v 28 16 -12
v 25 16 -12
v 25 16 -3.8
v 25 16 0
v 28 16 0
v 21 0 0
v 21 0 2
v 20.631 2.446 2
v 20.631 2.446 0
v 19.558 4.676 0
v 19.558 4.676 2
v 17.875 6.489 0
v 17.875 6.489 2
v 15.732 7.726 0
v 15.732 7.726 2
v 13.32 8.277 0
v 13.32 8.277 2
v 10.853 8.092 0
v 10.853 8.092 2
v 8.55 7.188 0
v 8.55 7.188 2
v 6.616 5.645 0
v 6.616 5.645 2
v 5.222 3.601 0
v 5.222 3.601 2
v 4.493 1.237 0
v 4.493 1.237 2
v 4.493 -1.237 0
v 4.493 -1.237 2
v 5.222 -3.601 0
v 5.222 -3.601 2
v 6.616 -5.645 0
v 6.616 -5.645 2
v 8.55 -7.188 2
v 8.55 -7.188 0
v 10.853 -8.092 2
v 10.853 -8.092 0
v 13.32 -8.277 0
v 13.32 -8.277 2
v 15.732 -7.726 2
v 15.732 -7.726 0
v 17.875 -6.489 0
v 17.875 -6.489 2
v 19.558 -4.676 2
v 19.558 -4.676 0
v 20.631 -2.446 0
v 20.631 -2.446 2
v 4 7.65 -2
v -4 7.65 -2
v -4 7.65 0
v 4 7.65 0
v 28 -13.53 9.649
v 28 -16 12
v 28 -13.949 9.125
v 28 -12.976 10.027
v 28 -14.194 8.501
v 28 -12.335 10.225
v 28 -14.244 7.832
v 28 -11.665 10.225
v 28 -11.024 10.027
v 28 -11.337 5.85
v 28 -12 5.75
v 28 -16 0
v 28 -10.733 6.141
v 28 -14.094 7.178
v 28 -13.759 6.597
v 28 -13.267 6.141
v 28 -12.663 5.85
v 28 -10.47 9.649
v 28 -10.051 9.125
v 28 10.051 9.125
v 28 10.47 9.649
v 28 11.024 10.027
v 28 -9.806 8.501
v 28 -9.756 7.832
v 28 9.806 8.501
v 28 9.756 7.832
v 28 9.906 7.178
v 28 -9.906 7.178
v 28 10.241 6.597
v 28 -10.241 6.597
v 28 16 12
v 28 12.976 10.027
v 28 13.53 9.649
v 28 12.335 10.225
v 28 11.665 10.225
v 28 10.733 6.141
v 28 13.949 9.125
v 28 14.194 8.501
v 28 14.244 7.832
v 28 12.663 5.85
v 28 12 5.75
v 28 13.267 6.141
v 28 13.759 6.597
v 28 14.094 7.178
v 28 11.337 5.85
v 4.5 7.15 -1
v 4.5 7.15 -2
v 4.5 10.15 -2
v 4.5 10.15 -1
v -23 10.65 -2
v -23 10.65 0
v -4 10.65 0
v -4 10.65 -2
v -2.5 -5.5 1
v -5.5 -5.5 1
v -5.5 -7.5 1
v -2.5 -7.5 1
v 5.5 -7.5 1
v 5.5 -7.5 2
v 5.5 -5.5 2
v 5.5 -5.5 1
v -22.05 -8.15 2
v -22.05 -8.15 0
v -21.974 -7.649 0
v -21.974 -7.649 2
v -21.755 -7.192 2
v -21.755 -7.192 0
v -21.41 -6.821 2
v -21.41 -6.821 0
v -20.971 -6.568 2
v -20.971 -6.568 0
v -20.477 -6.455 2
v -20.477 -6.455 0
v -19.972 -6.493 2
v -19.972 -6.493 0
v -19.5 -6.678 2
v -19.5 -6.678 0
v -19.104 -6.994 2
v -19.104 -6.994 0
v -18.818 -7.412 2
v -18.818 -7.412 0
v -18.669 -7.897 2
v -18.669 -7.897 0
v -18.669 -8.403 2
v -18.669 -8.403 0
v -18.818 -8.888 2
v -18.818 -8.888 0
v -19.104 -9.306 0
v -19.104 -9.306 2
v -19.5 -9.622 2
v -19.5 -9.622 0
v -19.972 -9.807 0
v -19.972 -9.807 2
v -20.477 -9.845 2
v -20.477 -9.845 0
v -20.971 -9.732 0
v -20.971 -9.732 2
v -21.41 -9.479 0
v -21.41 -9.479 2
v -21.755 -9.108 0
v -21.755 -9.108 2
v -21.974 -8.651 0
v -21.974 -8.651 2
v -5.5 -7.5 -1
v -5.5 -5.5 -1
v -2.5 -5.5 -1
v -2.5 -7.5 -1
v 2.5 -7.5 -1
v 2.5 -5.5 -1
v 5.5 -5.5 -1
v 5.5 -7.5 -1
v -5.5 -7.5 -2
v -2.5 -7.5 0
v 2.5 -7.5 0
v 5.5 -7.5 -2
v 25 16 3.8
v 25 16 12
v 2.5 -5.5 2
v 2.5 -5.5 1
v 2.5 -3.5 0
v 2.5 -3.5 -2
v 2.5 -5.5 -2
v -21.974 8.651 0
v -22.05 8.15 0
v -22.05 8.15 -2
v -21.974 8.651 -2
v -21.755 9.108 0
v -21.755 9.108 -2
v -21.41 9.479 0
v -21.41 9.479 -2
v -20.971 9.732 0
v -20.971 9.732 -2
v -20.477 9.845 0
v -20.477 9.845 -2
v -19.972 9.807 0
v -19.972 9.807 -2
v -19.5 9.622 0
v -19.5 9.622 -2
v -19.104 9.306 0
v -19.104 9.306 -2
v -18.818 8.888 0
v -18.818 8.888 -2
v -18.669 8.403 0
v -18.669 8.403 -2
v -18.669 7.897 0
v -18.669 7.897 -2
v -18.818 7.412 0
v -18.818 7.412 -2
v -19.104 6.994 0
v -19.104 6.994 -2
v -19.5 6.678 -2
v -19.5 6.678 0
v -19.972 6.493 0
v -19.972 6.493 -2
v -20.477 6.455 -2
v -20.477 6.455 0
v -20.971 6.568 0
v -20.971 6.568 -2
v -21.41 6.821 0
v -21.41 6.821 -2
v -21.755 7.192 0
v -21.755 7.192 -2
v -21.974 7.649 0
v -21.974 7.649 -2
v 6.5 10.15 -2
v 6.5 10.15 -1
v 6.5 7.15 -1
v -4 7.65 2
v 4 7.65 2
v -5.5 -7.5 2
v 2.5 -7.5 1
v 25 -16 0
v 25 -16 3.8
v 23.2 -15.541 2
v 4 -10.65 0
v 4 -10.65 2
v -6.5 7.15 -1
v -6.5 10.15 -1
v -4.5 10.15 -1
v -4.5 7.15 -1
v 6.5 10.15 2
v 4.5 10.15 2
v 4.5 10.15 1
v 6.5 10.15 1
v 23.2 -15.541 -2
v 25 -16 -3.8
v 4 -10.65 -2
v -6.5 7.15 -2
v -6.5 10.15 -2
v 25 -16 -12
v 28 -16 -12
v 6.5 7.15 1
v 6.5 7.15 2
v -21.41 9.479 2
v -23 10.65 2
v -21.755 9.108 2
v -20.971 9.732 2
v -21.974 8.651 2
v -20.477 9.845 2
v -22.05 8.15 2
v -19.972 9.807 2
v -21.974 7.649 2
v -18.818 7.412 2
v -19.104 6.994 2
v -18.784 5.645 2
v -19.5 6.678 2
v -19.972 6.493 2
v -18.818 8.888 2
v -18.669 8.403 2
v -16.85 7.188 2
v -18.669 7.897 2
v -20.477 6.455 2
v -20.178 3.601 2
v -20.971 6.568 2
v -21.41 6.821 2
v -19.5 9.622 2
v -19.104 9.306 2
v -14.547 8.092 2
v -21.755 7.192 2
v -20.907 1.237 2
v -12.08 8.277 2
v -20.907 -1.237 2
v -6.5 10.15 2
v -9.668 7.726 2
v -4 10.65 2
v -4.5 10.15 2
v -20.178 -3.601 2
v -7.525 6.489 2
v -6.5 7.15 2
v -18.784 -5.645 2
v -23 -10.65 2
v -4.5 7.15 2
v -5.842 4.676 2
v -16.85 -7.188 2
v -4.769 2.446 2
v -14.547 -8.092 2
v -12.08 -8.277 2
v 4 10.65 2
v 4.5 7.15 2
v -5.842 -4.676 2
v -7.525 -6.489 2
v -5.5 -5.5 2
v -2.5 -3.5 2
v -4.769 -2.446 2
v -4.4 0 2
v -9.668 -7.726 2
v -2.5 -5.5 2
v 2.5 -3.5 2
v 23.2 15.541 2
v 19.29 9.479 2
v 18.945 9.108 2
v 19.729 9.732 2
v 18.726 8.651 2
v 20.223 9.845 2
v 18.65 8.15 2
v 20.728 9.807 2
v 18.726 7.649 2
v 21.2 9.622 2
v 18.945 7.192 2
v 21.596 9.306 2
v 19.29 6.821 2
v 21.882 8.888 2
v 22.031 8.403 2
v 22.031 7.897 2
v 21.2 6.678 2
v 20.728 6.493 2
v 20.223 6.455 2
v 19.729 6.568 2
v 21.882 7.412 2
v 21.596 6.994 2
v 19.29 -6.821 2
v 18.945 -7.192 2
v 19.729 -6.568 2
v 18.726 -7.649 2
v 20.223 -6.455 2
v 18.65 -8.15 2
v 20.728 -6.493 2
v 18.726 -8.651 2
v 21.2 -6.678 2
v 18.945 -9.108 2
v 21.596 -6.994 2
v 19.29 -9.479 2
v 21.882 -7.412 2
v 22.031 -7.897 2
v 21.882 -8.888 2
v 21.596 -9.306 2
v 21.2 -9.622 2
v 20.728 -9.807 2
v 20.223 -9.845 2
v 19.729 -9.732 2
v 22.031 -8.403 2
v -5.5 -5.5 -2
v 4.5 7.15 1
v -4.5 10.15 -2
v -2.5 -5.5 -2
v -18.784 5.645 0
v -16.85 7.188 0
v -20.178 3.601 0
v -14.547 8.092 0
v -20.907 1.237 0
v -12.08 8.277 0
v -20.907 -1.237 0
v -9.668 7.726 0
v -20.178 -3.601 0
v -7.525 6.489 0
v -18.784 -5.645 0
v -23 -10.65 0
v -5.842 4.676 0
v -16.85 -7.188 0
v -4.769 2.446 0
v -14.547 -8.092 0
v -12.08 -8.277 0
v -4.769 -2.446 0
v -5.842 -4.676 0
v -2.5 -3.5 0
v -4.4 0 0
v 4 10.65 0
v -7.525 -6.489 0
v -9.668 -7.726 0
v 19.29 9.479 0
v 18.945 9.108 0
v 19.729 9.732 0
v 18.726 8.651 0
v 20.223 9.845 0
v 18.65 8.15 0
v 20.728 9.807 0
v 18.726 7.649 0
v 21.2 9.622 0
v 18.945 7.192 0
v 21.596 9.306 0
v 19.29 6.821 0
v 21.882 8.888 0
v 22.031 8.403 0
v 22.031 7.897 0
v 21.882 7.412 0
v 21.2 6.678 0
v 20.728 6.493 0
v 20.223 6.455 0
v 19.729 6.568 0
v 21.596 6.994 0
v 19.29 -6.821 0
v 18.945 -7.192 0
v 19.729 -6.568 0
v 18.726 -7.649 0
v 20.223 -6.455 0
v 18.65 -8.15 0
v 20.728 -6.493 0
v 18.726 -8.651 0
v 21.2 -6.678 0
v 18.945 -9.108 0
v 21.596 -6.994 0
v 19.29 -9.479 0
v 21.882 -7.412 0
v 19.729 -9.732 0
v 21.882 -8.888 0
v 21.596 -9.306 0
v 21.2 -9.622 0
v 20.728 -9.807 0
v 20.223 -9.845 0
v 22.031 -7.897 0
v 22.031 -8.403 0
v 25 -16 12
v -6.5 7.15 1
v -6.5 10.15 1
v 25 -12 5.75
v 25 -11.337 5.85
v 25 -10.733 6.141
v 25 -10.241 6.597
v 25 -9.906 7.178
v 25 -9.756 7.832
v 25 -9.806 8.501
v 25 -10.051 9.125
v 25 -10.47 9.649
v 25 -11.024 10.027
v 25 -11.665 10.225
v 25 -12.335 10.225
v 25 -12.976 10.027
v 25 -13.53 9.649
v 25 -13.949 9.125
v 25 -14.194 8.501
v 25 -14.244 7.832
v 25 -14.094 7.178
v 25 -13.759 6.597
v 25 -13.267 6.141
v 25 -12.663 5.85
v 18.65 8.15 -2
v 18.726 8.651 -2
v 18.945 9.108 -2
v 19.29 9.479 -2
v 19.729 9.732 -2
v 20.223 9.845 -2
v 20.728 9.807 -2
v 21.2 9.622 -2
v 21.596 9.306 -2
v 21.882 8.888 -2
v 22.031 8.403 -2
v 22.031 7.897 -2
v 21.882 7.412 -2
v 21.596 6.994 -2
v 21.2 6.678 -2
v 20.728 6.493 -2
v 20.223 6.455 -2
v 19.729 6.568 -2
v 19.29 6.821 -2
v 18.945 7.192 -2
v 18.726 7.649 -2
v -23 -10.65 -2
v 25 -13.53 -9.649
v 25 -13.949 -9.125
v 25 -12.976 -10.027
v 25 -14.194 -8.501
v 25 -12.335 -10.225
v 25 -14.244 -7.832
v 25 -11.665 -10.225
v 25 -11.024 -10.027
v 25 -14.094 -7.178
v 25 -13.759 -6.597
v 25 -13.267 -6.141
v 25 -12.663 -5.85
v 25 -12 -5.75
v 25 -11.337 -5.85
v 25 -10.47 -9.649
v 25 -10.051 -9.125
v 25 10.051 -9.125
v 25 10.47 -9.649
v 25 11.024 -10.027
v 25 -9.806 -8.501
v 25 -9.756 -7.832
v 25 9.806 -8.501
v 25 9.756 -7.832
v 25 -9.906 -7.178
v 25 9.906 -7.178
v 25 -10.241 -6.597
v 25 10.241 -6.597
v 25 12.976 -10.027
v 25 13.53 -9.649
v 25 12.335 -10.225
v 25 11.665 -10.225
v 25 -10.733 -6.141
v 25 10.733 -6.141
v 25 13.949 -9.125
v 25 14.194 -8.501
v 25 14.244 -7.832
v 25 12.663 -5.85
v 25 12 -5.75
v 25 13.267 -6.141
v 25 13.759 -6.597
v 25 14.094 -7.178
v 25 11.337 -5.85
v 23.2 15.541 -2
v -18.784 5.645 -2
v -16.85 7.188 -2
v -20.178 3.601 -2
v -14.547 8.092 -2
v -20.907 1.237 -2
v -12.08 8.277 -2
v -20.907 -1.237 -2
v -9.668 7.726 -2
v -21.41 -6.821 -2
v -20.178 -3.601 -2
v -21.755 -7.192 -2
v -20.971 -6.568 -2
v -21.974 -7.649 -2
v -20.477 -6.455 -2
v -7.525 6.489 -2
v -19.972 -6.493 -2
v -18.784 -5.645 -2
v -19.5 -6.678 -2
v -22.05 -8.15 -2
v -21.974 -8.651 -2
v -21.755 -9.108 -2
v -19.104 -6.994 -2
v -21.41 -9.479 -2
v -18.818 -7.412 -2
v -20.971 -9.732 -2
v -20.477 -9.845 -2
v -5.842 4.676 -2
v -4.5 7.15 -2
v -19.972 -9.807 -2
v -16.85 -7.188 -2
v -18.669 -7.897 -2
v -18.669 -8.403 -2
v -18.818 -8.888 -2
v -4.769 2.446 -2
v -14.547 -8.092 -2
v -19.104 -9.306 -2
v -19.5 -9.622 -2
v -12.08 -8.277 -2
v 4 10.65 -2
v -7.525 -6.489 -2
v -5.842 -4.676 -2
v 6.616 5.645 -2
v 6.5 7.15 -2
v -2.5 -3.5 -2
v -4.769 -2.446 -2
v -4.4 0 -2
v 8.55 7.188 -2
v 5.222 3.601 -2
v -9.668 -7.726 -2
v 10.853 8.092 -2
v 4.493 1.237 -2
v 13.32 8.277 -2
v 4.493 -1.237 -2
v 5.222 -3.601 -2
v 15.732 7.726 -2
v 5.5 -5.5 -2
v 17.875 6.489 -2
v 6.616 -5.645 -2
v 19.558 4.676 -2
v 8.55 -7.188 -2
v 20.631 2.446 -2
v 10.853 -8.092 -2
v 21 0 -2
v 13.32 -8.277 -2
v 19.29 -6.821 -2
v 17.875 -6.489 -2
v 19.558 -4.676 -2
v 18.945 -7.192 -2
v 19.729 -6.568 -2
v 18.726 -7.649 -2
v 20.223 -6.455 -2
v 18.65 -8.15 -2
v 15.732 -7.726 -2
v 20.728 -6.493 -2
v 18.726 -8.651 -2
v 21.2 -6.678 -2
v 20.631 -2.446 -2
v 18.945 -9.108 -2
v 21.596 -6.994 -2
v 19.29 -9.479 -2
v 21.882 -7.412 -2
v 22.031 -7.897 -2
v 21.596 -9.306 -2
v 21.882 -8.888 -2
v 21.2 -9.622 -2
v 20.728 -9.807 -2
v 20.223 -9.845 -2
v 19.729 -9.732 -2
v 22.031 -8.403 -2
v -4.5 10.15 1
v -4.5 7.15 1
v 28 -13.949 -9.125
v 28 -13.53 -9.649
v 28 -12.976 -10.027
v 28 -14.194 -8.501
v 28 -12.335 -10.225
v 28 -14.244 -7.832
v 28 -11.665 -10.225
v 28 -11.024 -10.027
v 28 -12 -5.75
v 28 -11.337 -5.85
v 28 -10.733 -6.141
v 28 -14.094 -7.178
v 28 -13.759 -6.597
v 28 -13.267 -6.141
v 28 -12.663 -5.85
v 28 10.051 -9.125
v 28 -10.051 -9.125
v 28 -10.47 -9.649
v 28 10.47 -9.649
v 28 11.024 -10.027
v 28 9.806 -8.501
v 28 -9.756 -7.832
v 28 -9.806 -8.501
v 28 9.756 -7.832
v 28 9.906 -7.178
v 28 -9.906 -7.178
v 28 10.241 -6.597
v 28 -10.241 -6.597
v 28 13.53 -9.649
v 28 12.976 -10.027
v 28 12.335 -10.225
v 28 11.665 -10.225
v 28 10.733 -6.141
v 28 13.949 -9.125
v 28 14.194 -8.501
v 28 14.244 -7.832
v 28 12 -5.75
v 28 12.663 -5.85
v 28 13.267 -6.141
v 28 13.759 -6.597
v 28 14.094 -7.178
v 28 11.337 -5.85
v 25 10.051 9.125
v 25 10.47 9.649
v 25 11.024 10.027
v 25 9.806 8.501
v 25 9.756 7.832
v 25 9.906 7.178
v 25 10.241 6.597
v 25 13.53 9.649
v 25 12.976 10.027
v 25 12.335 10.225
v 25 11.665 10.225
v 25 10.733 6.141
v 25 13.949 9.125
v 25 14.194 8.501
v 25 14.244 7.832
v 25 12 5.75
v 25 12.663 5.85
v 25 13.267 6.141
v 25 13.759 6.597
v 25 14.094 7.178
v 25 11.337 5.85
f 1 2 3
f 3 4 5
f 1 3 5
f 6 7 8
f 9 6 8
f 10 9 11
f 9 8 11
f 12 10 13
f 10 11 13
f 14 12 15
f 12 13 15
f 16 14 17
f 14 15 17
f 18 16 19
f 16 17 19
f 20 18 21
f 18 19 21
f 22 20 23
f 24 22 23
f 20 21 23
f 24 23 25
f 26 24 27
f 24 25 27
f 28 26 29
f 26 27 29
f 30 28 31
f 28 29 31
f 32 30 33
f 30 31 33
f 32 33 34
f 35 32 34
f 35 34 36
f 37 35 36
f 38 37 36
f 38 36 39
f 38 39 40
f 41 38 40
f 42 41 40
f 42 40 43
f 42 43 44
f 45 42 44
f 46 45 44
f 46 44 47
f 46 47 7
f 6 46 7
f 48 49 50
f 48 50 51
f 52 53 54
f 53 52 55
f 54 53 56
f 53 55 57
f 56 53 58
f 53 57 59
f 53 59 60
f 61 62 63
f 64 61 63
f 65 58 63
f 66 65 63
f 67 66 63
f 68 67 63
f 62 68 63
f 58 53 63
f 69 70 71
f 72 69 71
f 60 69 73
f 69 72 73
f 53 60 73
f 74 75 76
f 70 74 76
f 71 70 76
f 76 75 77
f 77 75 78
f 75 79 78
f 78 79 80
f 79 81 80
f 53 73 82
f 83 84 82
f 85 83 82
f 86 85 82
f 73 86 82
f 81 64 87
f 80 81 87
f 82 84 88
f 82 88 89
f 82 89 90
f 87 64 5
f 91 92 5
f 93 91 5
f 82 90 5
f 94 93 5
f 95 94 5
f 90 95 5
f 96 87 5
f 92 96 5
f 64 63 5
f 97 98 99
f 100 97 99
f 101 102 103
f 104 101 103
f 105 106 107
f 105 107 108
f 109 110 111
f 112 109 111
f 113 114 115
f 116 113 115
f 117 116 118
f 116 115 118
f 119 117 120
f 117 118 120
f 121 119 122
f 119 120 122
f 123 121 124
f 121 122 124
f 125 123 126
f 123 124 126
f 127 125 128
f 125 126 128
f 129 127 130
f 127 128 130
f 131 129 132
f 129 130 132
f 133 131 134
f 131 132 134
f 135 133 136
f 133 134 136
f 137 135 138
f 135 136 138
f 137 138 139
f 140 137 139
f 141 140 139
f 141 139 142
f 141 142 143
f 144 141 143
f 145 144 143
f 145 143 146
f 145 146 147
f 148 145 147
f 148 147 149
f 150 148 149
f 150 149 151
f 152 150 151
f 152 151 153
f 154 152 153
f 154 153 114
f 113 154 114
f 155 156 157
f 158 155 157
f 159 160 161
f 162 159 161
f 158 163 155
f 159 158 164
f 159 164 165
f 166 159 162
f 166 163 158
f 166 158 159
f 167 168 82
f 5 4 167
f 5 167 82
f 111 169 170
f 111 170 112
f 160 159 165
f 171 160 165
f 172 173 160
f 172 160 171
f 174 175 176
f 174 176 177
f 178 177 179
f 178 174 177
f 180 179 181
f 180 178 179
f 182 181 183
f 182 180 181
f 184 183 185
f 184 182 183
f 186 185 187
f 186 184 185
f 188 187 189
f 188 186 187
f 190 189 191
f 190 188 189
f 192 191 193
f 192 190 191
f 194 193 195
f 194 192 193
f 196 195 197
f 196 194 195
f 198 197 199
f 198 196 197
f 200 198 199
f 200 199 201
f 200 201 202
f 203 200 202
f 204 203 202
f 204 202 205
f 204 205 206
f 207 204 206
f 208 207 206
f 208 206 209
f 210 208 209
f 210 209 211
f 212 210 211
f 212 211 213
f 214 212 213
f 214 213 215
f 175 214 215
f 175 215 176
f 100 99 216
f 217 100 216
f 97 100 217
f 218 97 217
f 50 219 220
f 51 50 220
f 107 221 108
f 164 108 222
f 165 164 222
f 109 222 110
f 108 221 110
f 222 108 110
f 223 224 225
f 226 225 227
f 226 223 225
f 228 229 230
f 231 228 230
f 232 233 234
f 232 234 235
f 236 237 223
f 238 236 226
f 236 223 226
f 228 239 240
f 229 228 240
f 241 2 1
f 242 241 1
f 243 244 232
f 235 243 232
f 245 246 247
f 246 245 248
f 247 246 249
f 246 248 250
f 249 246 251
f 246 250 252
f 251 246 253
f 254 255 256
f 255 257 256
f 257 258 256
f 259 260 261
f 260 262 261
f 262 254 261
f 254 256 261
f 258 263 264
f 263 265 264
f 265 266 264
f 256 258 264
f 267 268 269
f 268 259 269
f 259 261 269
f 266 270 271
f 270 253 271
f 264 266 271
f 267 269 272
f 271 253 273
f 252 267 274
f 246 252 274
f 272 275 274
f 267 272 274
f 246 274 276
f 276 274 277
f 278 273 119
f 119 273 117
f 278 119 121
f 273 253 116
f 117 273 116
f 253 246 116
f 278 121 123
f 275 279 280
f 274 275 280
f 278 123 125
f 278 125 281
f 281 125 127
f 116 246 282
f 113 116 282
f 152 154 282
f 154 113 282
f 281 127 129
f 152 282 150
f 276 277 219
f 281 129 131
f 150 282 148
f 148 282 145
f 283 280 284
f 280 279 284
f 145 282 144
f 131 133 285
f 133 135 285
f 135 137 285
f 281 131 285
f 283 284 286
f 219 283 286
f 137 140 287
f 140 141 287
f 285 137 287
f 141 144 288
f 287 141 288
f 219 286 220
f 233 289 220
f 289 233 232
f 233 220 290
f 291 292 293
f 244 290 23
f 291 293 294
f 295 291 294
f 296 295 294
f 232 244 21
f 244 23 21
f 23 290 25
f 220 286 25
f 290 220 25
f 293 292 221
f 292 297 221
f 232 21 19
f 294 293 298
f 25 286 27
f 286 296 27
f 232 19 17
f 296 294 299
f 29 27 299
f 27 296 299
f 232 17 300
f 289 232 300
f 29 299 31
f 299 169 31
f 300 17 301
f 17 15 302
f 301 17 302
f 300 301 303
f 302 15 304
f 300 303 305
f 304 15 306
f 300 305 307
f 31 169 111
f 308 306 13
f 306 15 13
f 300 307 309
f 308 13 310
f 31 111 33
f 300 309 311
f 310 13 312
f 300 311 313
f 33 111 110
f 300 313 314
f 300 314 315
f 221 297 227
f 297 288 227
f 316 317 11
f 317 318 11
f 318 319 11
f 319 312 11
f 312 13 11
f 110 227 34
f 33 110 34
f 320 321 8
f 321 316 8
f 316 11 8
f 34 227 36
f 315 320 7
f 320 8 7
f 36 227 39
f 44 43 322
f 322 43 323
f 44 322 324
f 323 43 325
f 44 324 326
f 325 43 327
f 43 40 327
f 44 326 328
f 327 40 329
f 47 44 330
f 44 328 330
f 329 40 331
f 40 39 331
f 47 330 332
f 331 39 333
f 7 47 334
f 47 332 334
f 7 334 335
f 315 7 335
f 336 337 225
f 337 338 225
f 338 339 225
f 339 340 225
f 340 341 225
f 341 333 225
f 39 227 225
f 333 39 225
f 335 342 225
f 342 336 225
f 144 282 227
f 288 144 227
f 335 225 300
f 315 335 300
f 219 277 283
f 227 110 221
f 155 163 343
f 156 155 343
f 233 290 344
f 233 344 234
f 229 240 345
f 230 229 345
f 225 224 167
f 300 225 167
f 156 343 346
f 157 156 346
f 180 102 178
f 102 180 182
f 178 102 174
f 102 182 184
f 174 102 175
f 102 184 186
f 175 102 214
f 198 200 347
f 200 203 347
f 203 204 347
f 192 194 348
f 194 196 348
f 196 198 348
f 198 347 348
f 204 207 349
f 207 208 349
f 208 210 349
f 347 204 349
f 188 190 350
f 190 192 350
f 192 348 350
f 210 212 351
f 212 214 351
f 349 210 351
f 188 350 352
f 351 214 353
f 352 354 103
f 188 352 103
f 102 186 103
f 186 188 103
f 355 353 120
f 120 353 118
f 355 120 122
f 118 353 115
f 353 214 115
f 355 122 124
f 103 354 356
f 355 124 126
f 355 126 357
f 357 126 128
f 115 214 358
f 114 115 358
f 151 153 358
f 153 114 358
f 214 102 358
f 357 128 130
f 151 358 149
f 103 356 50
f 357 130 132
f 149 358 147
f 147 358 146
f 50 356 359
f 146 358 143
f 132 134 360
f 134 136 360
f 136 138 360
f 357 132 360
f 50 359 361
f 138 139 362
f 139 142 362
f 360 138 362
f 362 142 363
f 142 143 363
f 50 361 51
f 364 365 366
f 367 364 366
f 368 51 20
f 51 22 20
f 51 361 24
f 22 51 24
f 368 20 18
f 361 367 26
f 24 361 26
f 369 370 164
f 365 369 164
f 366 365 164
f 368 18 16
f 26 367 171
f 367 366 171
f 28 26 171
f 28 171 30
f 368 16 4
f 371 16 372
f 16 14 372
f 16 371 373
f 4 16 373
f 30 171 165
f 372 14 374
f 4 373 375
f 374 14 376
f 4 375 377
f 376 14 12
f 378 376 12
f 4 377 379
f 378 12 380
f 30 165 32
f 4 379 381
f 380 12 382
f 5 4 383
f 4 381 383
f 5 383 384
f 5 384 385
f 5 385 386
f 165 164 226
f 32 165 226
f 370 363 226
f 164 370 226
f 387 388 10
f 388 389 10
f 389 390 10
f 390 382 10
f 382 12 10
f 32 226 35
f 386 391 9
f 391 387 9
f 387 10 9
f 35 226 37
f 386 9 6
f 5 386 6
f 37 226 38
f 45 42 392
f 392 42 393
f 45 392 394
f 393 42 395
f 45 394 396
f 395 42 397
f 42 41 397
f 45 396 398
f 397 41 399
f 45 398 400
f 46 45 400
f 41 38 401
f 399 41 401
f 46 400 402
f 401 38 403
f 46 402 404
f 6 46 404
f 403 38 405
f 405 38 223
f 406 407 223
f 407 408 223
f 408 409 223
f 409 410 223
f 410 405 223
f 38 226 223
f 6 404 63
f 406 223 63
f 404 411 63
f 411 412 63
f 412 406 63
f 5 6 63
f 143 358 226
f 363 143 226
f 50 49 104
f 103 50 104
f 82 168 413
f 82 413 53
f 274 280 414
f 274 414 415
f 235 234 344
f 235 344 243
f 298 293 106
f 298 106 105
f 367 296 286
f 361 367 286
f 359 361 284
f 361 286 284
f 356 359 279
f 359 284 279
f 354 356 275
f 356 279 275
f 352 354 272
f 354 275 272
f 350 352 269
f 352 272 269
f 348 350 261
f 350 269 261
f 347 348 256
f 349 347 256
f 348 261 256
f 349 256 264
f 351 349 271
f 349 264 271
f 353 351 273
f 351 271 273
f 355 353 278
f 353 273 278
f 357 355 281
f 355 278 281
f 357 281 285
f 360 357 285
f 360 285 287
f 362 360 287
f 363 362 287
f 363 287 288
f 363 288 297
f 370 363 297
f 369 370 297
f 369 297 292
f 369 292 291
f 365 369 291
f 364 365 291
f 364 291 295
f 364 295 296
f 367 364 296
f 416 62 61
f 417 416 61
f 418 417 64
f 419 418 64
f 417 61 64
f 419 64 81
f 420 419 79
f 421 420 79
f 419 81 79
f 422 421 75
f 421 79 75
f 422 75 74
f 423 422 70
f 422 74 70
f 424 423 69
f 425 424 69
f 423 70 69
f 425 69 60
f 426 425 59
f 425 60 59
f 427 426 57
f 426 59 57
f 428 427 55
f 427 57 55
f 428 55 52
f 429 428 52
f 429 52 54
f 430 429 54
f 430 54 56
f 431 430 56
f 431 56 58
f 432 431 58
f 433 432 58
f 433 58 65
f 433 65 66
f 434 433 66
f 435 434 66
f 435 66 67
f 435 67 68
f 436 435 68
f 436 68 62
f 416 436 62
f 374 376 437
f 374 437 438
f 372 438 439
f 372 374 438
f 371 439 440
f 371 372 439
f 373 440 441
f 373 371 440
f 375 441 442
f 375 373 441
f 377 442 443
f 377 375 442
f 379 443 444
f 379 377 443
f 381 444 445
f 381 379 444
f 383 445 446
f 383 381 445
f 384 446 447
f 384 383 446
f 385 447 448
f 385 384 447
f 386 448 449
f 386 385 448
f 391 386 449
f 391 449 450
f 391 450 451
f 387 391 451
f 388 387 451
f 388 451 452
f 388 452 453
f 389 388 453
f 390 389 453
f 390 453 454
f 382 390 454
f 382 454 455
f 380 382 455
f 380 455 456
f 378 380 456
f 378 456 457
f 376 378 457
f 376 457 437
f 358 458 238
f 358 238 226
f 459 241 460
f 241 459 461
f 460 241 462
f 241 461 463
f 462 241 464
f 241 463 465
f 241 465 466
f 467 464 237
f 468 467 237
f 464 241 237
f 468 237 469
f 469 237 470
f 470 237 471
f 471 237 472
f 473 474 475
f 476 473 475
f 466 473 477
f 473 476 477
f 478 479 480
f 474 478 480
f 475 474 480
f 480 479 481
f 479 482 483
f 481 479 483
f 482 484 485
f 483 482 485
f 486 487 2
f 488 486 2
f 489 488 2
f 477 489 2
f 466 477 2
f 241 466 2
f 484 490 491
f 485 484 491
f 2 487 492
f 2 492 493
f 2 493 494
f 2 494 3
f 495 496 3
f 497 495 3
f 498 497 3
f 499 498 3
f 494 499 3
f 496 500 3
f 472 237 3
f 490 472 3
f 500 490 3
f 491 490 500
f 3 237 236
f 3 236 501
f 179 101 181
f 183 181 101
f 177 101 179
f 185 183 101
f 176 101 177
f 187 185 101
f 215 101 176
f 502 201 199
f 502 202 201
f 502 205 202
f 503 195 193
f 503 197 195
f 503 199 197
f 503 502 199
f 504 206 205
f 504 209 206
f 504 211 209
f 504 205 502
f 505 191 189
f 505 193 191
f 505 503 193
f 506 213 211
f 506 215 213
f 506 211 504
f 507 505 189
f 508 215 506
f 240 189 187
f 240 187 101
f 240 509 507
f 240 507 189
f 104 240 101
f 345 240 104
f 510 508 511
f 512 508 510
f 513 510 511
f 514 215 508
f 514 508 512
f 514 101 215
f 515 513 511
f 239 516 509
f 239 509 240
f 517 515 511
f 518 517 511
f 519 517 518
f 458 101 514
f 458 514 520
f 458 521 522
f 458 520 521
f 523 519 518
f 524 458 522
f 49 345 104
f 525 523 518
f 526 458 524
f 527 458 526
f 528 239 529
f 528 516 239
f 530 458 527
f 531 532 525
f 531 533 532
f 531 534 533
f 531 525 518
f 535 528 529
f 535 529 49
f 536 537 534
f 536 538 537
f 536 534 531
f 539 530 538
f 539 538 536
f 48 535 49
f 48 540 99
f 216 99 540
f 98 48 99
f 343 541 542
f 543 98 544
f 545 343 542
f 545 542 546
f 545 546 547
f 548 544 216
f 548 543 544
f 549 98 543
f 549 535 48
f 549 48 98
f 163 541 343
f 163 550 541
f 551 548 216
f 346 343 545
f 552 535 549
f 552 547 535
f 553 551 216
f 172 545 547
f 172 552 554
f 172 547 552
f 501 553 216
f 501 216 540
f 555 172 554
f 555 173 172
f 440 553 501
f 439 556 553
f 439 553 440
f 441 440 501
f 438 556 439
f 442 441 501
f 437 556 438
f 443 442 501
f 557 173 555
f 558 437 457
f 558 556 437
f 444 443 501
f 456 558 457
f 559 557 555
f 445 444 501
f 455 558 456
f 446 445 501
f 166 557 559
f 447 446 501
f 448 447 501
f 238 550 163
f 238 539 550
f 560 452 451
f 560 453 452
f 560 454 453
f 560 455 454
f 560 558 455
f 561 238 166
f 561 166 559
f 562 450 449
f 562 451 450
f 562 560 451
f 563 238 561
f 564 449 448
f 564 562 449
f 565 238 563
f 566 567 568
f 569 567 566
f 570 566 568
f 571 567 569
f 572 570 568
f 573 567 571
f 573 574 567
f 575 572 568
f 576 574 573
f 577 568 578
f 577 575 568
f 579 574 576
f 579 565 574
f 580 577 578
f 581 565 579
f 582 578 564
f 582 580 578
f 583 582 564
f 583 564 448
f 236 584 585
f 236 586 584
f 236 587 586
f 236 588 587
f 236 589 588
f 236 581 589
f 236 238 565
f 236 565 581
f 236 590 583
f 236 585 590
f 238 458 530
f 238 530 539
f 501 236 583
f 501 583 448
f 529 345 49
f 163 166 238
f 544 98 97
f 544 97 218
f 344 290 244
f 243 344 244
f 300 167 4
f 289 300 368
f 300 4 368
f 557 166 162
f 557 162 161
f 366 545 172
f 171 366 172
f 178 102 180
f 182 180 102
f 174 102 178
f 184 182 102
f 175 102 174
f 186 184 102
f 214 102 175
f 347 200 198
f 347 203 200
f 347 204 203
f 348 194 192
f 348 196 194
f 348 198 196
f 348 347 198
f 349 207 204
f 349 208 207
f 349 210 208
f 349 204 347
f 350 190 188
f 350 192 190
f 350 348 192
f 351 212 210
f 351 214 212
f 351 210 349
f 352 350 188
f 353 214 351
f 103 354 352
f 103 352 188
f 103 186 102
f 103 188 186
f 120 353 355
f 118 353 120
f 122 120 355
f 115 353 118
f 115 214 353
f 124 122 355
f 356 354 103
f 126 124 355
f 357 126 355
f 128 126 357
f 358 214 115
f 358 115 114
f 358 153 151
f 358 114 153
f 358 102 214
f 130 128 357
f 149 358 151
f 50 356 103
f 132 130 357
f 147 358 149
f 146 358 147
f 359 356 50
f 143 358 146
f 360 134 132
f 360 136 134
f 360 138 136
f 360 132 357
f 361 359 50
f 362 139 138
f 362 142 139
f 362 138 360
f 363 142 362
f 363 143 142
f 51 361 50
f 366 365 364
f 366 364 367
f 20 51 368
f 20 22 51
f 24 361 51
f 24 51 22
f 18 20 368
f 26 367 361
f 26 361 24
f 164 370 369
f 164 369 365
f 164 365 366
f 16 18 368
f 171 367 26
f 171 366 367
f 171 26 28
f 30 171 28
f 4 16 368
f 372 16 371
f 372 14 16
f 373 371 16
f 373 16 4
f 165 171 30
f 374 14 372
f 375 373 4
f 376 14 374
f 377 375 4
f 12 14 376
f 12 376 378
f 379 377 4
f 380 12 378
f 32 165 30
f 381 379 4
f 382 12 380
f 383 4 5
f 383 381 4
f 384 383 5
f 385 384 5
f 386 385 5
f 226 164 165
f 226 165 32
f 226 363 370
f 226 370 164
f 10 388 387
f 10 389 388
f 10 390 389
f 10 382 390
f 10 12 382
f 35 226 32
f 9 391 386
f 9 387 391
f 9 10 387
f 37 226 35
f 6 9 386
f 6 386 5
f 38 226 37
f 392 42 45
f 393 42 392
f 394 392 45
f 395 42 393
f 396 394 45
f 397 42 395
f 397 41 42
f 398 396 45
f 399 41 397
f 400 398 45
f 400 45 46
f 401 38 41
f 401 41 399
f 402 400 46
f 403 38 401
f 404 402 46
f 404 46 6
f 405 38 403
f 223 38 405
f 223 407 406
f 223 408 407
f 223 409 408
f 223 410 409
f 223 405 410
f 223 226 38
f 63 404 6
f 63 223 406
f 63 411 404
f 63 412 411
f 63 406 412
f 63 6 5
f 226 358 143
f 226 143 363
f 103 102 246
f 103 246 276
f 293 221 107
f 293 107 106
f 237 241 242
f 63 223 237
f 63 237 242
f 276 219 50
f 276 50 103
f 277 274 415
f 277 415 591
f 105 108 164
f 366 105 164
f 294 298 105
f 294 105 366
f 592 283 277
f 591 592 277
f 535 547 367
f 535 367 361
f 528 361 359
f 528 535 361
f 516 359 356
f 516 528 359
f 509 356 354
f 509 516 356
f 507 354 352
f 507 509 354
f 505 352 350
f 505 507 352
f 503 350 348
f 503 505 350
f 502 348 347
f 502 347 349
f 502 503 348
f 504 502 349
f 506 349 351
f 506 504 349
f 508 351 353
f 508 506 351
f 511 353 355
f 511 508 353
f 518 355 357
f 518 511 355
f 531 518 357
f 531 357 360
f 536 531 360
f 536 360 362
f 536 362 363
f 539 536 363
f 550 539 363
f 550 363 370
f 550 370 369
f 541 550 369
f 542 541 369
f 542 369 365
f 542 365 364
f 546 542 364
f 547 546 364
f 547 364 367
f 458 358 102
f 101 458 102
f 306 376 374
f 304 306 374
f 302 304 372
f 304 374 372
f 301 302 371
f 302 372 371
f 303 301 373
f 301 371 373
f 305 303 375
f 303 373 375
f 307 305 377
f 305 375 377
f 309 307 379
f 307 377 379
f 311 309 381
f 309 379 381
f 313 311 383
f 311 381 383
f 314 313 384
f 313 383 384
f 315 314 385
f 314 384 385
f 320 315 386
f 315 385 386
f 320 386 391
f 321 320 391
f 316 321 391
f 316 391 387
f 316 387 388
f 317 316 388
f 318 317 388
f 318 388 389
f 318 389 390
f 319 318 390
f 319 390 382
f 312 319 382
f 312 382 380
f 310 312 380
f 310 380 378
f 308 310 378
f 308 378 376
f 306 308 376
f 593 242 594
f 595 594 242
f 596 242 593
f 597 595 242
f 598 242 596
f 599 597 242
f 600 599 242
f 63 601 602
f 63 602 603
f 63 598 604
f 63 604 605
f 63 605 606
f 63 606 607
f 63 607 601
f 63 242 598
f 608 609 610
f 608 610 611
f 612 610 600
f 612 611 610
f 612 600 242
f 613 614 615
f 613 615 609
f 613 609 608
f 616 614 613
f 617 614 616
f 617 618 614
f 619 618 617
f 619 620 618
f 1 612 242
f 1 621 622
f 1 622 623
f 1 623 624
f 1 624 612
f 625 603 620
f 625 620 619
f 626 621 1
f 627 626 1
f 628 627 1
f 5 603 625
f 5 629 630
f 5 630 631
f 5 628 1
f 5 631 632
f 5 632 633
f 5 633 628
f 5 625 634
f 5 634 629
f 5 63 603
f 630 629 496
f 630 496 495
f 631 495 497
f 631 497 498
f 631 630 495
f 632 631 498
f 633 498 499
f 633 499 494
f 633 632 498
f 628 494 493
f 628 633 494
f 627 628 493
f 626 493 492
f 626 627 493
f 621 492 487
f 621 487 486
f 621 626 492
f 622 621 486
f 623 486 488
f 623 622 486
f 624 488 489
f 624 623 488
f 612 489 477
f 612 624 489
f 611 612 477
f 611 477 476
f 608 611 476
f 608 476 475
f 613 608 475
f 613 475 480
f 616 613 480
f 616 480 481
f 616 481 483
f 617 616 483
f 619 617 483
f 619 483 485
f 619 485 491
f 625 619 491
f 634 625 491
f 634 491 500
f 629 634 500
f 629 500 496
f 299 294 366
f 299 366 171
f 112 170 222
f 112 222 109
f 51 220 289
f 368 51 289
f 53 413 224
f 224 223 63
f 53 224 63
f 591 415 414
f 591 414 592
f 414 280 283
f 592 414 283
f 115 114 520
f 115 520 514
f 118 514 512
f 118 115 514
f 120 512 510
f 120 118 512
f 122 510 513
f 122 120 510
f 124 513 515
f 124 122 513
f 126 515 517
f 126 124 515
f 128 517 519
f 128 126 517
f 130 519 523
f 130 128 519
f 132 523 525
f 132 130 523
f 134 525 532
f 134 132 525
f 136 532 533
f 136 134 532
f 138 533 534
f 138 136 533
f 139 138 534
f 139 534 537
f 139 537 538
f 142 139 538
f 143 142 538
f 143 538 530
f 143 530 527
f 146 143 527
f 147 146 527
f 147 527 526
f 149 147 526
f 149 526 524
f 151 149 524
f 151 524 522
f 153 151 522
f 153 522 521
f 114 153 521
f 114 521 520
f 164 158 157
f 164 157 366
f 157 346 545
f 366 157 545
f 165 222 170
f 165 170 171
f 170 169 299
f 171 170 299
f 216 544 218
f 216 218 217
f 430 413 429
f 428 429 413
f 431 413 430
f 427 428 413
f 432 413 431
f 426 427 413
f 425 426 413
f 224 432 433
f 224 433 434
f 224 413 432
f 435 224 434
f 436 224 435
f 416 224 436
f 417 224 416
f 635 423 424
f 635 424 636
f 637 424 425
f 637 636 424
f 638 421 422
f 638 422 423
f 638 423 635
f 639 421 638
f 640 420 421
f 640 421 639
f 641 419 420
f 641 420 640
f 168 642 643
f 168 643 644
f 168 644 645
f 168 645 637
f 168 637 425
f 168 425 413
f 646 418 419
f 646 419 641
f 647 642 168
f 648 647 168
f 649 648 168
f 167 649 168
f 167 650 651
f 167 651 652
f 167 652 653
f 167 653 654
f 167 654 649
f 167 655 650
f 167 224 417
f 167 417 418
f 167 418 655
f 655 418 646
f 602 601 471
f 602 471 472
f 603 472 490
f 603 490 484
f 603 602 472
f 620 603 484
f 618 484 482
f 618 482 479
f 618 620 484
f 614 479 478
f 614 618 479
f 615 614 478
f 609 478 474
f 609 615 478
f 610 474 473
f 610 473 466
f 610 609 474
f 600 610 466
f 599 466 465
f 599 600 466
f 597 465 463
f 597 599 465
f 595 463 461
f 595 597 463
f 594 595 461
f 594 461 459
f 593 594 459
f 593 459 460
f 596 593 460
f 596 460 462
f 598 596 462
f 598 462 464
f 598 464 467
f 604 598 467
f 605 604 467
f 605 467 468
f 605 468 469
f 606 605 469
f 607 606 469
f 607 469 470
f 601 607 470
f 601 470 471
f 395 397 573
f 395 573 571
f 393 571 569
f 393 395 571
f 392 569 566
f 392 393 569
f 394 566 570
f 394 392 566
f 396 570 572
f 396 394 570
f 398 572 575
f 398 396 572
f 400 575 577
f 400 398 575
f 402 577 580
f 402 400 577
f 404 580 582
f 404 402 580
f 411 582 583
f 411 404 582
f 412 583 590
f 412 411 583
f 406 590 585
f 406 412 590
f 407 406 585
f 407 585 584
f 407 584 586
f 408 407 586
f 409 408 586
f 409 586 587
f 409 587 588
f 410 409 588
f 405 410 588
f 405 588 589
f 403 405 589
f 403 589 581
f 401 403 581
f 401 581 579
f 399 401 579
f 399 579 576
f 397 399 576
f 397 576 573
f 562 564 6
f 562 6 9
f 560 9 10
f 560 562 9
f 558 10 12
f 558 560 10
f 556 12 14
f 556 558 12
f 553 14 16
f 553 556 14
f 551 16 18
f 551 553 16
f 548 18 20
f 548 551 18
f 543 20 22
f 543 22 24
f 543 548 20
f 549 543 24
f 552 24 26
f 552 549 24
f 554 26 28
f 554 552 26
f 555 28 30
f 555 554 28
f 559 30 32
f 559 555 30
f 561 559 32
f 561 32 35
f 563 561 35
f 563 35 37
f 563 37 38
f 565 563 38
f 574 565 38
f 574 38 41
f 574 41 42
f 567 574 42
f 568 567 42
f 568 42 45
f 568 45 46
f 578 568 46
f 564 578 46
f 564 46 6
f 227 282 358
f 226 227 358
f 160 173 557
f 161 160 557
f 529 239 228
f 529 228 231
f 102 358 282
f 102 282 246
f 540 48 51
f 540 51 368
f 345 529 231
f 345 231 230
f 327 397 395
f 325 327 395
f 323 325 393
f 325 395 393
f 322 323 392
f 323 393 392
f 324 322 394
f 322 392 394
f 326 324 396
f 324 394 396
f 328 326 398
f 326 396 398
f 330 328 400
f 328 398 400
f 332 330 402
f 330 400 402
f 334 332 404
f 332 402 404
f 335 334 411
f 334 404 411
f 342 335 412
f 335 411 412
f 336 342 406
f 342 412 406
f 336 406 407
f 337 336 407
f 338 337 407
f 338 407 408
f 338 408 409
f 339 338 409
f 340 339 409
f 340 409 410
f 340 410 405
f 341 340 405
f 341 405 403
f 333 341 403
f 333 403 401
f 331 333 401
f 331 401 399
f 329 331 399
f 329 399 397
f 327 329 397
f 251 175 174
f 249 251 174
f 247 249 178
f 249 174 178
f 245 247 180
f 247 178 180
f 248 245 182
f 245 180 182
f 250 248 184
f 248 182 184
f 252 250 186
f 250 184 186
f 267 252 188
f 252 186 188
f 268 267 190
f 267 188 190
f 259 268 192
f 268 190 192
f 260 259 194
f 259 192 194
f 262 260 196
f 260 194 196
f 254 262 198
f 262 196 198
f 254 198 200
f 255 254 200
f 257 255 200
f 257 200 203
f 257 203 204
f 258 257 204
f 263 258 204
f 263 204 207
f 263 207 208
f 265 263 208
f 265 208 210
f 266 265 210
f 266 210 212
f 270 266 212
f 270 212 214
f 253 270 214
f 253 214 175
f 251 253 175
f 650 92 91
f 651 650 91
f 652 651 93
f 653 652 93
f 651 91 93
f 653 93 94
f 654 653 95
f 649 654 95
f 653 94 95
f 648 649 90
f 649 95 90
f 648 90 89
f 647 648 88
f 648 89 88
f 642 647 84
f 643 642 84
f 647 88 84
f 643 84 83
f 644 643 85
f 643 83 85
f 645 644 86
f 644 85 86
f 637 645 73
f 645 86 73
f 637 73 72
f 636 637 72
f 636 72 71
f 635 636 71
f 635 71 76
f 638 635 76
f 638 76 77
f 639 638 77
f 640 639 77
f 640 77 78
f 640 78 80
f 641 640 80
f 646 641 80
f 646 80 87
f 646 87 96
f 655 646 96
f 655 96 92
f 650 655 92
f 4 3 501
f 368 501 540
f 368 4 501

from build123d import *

# Parameters (mm, degrees)
SKETCH_1_W          = 46
SKETCH_1_H          = 21.3
EXTRUDE_1_DEPTH     = 2
SKETCH_2_R          = 8.3
CUT_EXTRUDE_1_DEPTH = 3
SKETCH_3_W          = 8
SKETCH_3_H          = 3
CUT_EXTRUDE_2_DEPTH = 3
SKETCH_4_W          = 5
SKETCH_4_H          = 4
CUT_EXTRUDE_3_DEPTH = 3
SKETCH_5_W          = 3
SKETCH_5_H          = 2
SKETCH_5_W_2        = 2
SKETCH_5_H_2        = 3
CUT_EXTRUDE_4_DEPTH = 1
HOLE_WIZARD_M3_1_D  = 3.4
SKETCH_13_W         = 2
SKETCH_13_H         = 21.3
EXTRUDE_5_DEPTH     = 2
SKETCH_9_W          = 3
SKETCH_9_H          = 32
EXTRUDE_3_DEPTH     = 12
HOLE_WIZARD_M4_1_D  = 4.5
EXTRUDE_4_DEPTH     = 2
CHAMFER_1_SIZE      = 1.8


with BuildPart() as part:
    # 草圖1 → 填料-伸長1 (new body)
    with BuildSketch(Plane.XY):
        Rectangle(SKETCH_1_W, SKETCH_1_H)
    extrude(amount=EXTRUDE_1_DEPTH)

    # 草圖2 → 除料-伸長1 (cut, through all)
    with BuildSketch(Plane.XY.offset(2)):
        with Locations((-12.7, 0)):
            Circle(SKETCH_2_R)
        with Locations((12.7, 0)):
            Circle(SKETCH_2_R)
    extrude(amount=-CUT_EXTRUDE_1_DEPTH, mode=Mode.SUBTRACT)

    # 草圖3 → 除料-伸長2 (cut, through all)
    with BuildSketch(Plane.XY.offset(2)):
        with Locations((0, 9.15)):
            Rectangle(SKETCH_3_W, SKETCH_3_H)
    extrude(amount=-CUT_EXTRUDE_2_DEPTH, mode=Mode.SUBTRACT)

    # 草圖4 → 除料-伸長3 (cut, through all)
    with BuildSketch(Plane.XY.offset(2)):
        with Locations((0, -5.5)):
            Rectangle(SKETCH_4_W, SKETCH_4_H)
    extrude(amount=-CUT_EXTRUDE_3_DEPTH, mode=Mode.SUBTRACT)

    # 草圖5 → 除料-伸長4 (cut)
    with BuildSketch(Plane.XY.offset(2)):
        with Locations((4, -6.5)):
            Rectangle(SKETCH_5_W, SKETCH_5_H)
        with Locations((-5.5, 8.65)):
            Rectangle(SKETCH_5_W_2, SKETCH_5_H_2)
        with Locations((5.5, 8.65)):
            Rectangle(SKETCH_5_W_2, SKETCH_5_H_2)
        with Locations((-4, -6.5)):
            Rectangle(SKETCH_5_W, SKETCH_5_H)
    extrude(amount=-CUT_EXTRUDE_4_DEPTH, mode=Mode.SUBTRACT)

    # M3 餘隙孔1 (through all)
    with Locations(Plane.XY.offset(2)):
        with Locations((20.35, 8.15), (-20.35, -8.15), (-20.35, 8.15), (20.35, -8.15)):
            Hole(HOLE_WIZARD_M3_1_D / 2)

    # 草圖13 → 填料-伸長5 (add)
    with BuildSketch(Plane(origin=(23, 0, 0), x_dir=(0, 0, -1), z_dir=(1, 0, 0))):
        with Locations((-1, 0)):
            Rectangle(SKETCH_13_W, SKETCH_13_H)
    extrude(amount=EXTRUDE_5_DEPTH)

    # 草圖9 → 填料-伸長3 (add)
    with BuildSketch(Plane.XY):
        with Locations((26.5, 0)):
            Rectangle(SKETCH_9_W, SKETCH_9_H)
    extrude(amount=EXTRUDE_3_DEPTH)

    # M4 餘隙孔1 (through all)
    with Locations(Plane.ZY.offset(-25)):
        with Locations((8, 12), (8, -12)):
            Hole(HOLE_WIZARD_M4_1_D / 2)

    # 草圖12 → 填料-伸長4 (add)
    with BuildSketch(Plane.XY):
        Polygon((25, 16), (4, 10.65), (25, 10.65), align=None)
    extrude_4 = extrude(amount=EXTRUDE_4_DEPTH)

    # 鏡射1: 填料-伸長4 across plane
    add(extrude_4.mirror(Plane.ZX))

    # 導角1
    chamfer_1_edges = [part.edges().sort_by_distance(p)[0] for p in [
        (25, 0, 2),
    ]]
    chamfer(chamfer_1_edges, length=CHAMFER_1_SIZE)


with BuildPart() as body_2:
    # 鏡射2: mirrored copy
    add(part.part.mirror(Plane.XY))


solid = Compound([part.part, body_2.part])
